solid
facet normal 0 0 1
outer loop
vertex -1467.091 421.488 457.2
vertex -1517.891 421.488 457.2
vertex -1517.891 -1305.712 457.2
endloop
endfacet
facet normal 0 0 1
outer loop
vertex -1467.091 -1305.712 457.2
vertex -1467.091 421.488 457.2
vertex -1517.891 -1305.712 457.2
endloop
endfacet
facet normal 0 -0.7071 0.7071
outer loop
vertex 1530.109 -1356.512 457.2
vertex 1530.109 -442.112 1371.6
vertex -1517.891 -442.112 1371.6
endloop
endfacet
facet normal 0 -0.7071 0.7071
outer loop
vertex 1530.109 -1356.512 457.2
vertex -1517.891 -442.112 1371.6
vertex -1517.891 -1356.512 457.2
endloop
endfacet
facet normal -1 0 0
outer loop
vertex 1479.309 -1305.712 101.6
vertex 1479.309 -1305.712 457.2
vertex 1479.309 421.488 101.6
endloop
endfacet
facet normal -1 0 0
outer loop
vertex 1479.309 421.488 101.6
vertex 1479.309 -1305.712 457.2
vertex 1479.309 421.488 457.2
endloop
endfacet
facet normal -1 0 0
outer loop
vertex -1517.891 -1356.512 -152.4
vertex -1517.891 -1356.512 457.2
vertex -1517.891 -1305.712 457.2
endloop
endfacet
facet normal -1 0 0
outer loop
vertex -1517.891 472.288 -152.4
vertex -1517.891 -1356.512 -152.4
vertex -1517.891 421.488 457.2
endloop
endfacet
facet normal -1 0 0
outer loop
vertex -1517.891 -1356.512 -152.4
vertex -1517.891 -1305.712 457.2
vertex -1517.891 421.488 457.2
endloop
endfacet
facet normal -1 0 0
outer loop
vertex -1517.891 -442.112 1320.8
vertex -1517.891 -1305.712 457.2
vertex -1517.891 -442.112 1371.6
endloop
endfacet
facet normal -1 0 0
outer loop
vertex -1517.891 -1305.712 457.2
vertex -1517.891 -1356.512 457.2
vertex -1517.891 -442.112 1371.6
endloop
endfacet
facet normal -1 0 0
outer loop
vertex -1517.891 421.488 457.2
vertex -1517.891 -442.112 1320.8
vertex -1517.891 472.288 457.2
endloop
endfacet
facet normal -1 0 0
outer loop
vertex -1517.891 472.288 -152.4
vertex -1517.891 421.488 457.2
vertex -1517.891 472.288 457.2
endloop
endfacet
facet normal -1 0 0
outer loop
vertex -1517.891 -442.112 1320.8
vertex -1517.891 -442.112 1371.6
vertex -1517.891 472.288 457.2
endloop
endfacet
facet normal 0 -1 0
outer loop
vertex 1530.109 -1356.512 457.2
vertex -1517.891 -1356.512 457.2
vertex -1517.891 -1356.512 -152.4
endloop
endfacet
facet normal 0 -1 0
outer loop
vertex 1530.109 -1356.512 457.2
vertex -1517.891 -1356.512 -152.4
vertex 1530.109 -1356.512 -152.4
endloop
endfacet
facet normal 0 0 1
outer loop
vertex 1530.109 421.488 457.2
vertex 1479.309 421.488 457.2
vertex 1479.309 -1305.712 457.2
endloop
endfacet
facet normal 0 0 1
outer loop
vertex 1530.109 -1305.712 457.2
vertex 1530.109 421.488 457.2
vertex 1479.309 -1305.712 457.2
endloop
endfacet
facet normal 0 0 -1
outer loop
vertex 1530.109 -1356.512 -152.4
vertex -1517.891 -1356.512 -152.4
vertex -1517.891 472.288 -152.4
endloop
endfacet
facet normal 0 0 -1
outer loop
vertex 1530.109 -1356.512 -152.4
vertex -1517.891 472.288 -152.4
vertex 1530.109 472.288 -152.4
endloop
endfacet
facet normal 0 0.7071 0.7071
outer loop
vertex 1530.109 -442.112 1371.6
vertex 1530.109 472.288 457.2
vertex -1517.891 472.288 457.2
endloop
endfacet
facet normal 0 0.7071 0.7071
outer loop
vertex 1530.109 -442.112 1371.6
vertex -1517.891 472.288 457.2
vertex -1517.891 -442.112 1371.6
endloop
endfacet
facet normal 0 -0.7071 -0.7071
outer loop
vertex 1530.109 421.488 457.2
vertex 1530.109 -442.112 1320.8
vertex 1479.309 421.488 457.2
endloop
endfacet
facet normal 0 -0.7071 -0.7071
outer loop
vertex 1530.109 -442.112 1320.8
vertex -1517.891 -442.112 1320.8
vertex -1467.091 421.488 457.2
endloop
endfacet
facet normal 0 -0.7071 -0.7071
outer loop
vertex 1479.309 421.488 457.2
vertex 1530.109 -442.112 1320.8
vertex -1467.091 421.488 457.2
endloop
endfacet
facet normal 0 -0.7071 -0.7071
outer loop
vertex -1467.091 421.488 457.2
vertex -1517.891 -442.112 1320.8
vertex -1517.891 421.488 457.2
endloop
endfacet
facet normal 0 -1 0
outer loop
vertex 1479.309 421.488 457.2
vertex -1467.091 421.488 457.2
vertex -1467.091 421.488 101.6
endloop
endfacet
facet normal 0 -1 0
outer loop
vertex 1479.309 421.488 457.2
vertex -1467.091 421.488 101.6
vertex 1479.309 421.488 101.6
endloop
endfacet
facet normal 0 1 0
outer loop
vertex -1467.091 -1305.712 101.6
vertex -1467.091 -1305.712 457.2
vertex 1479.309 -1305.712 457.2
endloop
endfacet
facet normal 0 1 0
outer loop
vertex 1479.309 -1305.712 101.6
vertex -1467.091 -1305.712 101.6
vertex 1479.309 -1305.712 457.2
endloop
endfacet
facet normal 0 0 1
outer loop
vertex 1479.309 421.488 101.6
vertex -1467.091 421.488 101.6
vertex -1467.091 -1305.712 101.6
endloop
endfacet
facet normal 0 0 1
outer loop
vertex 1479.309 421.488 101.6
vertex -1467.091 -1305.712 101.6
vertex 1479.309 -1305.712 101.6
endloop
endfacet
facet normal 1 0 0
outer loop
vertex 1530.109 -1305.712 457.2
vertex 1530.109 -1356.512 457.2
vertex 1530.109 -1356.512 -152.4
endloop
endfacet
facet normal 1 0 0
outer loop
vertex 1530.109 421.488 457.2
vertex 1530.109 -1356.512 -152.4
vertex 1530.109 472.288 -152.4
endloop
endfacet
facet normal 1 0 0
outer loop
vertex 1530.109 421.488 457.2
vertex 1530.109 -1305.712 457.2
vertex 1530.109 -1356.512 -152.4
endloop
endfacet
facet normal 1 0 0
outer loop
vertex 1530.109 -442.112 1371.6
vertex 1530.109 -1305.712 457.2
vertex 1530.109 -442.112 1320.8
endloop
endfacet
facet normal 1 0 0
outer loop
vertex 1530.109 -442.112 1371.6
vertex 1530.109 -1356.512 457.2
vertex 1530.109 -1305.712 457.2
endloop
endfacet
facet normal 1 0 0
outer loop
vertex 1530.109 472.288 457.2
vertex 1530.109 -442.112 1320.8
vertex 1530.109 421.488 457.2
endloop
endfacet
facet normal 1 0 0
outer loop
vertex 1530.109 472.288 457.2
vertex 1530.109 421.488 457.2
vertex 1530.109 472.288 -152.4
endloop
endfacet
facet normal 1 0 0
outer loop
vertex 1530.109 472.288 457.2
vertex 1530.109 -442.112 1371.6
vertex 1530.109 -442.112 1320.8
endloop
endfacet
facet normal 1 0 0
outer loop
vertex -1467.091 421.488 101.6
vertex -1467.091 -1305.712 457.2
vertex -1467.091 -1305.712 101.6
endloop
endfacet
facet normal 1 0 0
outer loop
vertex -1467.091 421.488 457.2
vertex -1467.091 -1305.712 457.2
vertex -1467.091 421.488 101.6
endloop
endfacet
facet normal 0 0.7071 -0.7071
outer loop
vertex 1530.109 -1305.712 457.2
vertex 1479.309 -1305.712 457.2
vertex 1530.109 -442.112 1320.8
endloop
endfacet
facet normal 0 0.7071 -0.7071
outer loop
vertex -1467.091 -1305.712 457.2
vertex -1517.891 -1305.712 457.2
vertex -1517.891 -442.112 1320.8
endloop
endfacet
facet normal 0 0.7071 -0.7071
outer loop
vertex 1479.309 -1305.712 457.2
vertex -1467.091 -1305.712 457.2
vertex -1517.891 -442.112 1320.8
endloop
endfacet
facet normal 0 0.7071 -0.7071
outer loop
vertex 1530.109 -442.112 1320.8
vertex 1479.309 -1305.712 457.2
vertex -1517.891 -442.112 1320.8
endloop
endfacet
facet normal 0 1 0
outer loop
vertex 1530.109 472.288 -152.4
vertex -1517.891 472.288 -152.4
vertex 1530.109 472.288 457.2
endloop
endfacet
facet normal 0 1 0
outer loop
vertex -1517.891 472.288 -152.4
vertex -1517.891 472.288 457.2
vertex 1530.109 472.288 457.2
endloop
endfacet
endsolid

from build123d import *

# Parameters (mm, degrees)
F0_W      = 3048
F0_H      = 1828.8
F1_DEPTH  = 457.2
F2_W      = 2946.4
F2_H      = 1727.2
F3_DEPTH  = 355.6
F6_W      = 3048
F6_H      = 1828.8
F7_DEPTH  = 152.4
F8_DEPTH  = 3048
F10_DEPTH = 3048


with BuildPart() as f1:
    # F0 (on Top) → F1 (new body)
    with BuildSketch(Plane.XY):
        with Locations((6.109137, -442.111972)):
            Rectangle(F0_W, F0_H)
    extrude(amount=F1_DEPTH)

    # F2 (on face) → F3 (cut)
    with BuildSketch(Plane.XY.offset(457.2)):
        with Locations((6.109137, -442.111972)):
            Rectangle(F2_W, F2_H)
    extrude(amount=-F3_DEPTH, mode=Mode.SUBTRACT)

    # F6 (on face) → F7 (join)
    with BuildSketch(Plane(origin=(0, 0, 0), x_dir=(1, 0, 0), z_dir=(0, 0, -1))):
        with Locations((6.109137, 442.111972)):
            Rectangle(F6_W, F6_H)
    extrude(amount=F7_DEPTH)

    # F5 (on face) → F8 (join)
    with BuildSketch(Plane.YZ.offset(1530.109137)):
        Polygon((-442.111972, 1371.6), (-1356.511972, 457.2), (472.288028, 457.2), align=None)
    extrude(amount=-F8_DEPTH)

    # F9 (on face) → F10 (cut)
    with BuildSketch(Plane(origin=(-1517.890863, 0, 0), x_dir=(0, -1, 0), z_dir=(-1, 0, 0))):
        Polygon((442.111972, 1320.8), (-421.488028, 457.2), (1305.711972, 457.2), align=None)
    extrude(amount=-F10_DEPTH, mode=Mode.SUBTRACT)


solid = f1.part
